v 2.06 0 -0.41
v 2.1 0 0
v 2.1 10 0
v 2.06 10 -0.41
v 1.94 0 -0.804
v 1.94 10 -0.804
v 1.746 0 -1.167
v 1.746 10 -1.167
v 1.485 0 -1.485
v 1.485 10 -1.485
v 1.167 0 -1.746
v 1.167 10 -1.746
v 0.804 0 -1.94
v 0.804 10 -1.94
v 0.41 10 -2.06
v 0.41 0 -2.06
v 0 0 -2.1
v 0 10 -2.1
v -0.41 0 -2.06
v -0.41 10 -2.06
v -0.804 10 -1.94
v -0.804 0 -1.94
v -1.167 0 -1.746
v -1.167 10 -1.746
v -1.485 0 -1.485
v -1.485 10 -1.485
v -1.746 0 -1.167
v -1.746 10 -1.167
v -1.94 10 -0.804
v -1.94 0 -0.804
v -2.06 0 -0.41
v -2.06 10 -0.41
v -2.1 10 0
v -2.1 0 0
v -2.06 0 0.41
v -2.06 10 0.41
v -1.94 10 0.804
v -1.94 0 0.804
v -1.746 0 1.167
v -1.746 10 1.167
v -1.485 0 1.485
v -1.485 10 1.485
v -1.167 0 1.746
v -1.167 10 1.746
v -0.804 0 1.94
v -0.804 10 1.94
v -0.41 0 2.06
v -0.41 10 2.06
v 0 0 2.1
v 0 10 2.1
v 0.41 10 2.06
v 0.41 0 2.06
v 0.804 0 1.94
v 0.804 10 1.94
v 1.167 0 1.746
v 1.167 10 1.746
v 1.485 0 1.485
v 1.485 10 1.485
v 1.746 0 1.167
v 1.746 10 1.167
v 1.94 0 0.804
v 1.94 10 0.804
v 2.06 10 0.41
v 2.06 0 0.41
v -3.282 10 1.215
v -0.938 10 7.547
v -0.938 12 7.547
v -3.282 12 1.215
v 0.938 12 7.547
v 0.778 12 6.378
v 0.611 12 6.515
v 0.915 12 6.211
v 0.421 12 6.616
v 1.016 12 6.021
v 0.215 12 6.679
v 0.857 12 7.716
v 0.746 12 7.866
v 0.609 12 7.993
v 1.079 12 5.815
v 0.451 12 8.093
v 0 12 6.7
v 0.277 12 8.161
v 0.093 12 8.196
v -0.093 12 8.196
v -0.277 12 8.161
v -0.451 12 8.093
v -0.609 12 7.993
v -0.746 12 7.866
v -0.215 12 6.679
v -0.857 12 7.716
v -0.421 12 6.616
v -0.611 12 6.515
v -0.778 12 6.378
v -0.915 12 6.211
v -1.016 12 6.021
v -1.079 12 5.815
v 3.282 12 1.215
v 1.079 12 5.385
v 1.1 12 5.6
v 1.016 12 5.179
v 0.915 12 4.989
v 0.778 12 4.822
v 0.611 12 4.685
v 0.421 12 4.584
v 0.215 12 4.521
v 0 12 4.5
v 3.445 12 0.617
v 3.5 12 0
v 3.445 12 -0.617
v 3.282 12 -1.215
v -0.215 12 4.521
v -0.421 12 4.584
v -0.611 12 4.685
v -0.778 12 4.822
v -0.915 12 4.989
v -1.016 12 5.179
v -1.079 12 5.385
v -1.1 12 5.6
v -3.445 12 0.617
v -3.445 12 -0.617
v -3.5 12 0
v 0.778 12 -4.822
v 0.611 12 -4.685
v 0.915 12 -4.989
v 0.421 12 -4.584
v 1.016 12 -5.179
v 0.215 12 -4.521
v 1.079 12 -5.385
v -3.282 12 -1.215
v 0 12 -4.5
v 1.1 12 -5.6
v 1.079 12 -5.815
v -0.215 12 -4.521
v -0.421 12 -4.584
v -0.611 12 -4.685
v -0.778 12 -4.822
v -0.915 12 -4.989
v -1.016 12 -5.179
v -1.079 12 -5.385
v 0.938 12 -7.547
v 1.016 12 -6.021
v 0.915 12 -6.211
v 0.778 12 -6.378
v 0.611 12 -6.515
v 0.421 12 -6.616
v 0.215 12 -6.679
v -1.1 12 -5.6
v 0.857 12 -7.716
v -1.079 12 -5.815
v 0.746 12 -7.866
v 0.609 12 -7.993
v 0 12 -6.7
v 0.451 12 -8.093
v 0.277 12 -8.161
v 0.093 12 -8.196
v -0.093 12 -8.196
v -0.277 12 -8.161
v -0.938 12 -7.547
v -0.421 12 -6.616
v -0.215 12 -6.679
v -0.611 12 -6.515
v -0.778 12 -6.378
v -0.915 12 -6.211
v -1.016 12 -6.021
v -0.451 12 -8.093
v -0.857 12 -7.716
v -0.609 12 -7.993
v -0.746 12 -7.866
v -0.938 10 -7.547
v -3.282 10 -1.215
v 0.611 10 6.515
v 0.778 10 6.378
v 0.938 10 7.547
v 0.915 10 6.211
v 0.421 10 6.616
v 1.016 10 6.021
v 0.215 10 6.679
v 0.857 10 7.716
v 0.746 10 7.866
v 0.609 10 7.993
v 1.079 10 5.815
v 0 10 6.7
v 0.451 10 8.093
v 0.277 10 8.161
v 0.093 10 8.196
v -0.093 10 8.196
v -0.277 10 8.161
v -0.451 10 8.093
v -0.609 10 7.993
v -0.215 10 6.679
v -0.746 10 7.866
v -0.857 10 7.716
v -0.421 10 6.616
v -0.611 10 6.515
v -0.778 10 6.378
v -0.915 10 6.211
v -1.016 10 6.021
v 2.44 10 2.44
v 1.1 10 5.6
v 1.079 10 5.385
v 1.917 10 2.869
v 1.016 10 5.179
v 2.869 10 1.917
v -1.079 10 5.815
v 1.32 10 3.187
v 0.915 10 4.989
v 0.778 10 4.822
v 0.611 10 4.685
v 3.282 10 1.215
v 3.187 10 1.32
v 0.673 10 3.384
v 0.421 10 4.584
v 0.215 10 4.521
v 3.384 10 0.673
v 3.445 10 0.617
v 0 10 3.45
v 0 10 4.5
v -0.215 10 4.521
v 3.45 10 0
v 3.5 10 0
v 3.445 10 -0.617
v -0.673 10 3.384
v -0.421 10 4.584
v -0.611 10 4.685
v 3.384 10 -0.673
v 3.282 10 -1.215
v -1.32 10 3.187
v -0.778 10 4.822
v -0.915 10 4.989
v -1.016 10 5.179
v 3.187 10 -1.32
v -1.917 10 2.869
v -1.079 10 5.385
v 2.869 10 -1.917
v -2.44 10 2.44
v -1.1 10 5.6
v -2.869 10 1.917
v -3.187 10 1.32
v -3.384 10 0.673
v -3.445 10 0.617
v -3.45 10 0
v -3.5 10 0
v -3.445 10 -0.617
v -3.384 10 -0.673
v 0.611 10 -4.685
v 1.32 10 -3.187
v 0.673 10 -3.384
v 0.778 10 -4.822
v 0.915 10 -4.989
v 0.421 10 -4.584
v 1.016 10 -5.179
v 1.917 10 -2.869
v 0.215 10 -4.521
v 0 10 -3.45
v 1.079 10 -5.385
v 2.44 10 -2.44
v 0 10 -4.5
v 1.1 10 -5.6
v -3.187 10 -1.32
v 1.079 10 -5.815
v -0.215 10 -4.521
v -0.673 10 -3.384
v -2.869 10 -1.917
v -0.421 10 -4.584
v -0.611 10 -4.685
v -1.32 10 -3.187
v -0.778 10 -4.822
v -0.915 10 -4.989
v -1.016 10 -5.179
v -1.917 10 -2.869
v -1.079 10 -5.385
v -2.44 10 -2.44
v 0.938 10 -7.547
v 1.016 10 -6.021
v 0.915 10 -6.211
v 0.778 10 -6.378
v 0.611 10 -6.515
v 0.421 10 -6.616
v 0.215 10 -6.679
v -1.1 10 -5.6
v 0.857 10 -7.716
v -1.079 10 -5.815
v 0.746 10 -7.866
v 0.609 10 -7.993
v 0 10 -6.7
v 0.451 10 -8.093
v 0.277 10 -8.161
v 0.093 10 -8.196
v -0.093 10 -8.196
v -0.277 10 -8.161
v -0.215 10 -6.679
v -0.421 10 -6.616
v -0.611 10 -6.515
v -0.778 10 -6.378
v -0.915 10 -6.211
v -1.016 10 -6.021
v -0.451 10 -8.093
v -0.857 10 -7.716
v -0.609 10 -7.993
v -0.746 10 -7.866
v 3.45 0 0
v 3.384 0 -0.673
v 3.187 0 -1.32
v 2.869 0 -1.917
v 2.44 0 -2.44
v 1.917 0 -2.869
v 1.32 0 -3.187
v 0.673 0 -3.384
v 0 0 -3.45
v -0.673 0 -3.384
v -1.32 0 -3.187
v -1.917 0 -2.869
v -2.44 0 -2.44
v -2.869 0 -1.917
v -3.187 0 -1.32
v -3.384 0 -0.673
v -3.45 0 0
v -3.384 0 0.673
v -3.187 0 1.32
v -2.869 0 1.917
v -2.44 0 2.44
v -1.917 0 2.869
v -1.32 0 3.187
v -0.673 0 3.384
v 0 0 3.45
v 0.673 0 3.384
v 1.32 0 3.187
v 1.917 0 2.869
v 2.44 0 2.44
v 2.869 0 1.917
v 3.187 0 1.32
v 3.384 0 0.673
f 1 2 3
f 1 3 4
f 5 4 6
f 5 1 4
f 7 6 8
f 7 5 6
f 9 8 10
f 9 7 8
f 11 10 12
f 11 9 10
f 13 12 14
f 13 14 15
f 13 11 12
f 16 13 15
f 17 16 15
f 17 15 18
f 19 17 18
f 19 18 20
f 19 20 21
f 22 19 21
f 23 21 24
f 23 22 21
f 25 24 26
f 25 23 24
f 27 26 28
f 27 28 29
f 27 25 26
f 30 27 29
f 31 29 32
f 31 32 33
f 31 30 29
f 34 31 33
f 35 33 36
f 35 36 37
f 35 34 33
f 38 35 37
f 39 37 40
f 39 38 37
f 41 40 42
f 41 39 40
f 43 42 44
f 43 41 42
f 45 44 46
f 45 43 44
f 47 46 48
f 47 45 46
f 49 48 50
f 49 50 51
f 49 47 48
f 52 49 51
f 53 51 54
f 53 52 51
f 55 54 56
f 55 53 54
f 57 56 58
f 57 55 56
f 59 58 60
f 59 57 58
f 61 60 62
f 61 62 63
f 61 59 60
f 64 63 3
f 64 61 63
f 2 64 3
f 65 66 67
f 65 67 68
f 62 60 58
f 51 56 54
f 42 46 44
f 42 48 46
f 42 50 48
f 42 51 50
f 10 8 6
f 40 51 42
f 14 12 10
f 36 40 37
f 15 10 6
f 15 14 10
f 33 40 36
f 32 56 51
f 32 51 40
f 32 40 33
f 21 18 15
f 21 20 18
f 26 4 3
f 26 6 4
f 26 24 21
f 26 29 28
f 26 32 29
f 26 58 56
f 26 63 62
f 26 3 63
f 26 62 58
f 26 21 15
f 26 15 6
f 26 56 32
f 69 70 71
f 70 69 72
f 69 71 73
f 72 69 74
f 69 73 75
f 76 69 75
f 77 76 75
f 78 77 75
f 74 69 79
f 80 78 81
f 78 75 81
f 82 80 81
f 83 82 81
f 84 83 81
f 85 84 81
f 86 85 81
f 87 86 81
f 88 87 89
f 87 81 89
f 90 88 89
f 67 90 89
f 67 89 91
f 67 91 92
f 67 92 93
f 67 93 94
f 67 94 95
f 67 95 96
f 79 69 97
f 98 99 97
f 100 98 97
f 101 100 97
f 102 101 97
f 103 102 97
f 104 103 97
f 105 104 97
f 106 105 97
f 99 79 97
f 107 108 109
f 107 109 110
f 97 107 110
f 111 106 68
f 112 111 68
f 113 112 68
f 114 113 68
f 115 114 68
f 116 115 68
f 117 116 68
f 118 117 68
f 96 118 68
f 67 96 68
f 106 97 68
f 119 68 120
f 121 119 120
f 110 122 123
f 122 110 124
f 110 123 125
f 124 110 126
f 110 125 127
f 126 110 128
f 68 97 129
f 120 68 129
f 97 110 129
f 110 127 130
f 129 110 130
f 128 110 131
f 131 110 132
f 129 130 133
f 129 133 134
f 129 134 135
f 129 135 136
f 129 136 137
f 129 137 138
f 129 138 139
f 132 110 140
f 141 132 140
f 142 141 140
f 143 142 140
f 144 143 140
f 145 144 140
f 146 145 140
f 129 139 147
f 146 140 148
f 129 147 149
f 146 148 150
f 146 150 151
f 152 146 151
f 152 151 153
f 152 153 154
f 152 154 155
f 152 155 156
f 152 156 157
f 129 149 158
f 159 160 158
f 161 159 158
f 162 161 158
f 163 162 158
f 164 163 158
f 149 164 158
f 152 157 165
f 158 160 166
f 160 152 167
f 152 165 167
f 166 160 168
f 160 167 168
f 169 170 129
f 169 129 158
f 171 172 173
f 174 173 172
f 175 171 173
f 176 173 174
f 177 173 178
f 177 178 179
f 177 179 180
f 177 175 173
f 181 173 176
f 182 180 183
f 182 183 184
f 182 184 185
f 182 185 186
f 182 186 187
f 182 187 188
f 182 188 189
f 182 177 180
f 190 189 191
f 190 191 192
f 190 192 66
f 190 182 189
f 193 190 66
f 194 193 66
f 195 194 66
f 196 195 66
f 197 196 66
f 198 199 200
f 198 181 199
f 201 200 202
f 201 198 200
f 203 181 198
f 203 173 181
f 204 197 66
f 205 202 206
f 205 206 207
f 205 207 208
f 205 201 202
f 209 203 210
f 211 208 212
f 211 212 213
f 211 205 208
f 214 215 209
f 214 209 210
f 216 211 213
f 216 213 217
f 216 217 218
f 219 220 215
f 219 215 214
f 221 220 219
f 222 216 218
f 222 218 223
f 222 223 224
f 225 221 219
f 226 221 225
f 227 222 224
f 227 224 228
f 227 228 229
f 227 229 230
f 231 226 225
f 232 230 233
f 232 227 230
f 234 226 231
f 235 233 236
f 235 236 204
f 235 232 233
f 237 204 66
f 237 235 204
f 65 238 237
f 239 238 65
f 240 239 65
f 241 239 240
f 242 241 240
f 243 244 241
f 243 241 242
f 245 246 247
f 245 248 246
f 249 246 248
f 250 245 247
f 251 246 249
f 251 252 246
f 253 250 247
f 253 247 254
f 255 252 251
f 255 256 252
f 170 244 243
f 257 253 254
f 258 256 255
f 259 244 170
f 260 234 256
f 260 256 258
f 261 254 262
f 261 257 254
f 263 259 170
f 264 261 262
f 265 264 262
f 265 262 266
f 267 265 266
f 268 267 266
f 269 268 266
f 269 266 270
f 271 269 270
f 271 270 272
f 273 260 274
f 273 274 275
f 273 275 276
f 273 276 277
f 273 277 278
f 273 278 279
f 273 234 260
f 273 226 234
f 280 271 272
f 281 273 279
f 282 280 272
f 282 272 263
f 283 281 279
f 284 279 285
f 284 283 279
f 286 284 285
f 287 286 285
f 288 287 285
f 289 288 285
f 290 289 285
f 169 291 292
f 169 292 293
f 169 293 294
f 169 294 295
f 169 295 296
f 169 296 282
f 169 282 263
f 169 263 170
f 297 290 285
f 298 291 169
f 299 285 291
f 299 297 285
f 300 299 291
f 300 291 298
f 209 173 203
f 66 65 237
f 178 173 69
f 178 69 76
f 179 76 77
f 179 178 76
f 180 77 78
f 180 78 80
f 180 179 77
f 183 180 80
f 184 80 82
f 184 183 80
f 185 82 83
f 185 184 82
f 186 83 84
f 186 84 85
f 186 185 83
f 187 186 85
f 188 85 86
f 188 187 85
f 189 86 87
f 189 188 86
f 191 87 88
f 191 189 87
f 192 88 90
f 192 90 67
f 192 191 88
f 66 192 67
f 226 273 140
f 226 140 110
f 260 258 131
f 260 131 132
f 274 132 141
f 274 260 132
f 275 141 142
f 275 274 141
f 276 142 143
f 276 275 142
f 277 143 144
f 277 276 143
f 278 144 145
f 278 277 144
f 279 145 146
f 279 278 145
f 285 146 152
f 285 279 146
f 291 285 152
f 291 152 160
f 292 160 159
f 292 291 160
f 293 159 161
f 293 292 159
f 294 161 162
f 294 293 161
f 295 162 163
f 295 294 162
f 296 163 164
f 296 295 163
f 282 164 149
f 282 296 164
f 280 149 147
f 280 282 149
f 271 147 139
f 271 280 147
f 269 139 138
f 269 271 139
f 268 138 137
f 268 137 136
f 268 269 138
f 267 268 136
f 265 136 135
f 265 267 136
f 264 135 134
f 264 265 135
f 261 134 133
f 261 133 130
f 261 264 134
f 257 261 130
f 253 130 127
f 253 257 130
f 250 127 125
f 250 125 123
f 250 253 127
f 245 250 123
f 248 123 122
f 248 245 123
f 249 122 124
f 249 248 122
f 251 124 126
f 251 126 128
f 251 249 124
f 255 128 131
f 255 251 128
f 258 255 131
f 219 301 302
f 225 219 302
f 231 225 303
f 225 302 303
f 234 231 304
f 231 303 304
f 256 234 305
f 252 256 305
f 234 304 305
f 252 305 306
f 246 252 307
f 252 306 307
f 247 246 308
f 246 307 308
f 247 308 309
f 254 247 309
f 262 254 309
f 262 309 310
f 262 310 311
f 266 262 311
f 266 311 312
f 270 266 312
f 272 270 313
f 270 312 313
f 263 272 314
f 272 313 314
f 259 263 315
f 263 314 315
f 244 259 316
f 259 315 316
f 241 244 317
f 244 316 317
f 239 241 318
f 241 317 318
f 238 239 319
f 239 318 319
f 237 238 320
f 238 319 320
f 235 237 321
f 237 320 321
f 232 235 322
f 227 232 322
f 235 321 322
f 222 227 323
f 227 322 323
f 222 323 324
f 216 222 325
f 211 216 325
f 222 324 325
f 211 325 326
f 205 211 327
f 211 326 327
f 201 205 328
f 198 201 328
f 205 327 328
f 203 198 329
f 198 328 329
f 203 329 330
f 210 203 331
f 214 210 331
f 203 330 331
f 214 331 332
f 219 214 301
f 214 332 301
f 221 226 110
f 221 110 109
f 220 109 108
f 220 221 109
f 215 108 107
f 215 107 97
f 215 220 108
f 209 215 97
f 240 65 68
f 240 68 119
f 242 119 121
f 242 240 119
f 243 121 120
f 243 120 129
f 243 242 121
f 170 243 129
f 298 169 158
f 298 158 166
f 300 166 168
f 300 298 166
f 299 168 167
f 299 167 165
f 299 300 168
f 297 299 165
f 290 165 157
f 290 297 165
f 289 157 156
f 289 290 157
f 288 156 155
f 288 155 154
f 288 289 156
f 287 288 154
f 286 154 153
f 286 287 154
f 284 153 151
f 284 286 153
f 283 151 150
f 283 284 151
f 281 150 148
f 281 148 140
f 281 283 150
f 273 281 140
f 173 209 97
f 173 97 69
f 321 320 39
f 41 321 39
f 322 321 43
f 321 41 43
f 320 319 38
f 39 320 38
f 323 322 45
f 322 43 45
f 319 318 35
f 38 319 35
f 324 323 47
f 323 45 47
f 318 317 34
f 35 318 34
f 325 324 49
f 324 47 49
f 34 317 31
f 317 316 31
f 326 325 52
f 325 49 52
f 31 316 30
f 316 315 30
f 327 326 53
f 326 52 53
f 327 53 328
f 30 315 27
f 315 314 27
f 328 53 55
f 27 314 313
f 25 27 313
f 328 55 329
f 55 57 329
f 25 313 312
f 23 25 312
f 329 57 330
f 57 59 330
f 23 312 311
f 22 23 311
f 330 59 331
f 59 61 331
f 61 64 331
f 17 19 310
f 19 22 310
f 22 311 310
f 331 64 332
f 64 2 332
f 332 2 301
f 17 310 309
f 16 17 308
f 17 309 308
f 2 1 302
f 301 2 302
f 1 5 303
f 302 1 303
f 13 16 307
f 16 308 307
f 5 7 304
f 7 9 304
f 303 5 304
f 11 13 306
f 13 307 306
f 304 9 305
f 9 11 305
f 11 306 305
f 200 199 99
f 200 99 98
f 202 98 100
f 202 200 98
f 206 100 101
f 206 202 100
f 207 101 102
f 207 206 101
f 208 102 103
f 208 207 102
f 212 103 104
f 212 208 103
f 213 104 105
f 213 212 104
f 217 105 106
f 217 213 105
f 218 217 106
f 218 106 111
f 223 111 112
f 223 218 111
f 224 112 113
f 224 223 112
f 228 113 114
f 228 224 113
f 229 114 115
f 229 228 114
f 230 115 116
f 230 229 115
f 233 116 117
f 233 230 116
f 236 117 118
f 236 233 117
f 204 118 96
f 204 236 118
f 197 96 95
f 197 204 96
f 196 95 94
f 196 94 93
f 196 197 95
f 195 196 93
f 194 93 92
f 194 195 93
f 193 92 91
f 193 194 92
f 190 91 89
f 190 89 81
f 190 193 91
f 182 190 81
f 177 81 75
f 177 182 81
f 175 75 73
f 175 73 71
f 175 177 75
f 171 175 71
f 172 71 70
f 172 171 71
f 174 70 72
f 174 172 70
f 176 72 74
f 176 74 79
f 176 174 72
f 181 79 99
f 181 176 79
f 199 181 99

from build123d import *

# Parameters (mm, degrees)
SKETCH1_R           = 3.45
SKETCH1_R_2         = 2.1
BOSS_EXTRUDE1_DEPTH = 10
SKETCH2_R           = 1.1
BOSS_EXTRUDE2_DEPTH = 2


with BuildPart() as part:
    # Sketch1 → Boss-Extrude1 (new body)
    with BuildSketch(Plane(origin=(0, 0, 0), x_dir=(1, 0, 0), z_dir=(0, 1, 0))):
        Circle(SKETCH1_R)
        Circle(SKETCH1_R_2, mode=Mode.SUBTRACT)
    extrude(amount=BOSS_EXTRUDE1_DEPTH)

    # Sketch2 → Boss-Extrude2 (add)
    with BuildSketch(Plane(origin=(0, 10, 0), x_dir=(1, 0, 0), z_dir=(0, 1, 0))):
        with BuildLine():
            Line((-3.282257873, 1.215229712), (-0.937787964, 7.547493269))
            ThreePointArc((-0.937787964, 7.547493269), (0, 8.200284779), (0.937787964, 7.547493269))
            Line((0.937787964, 7.547493269), (3.282257873, 1.215229712))
            ThreePointArc((3.282257873, 1.215229712), (3.5, 0), (3.282257873, -1.215229712))
            Line((3.282257873, -1.215229712), (0.937787964, -7.547493269))
            ThreePointArc((0.937787964, -7.547493269), (0, -8.200284779), (-0.937787964, -7.547493269))
            Line((-0.937787964, -7.547493269), (-3.282257873, -1.215229712))
            ThreePointArc((-3.282257873, -1.215229712), (-3.5, 0), (-3.282257873, 1.215229712))
        make_face()
        with Locations((0, -5.6)):
            Circle(SKETCH2_R, mode=Mode.SUBTRACT)
        with Locations((0, 5.6)):
            Circle(SKETCH2_R, mode=Mode.SUBTRACT)
    extrude(amount=BOSS_EXTRUDE2_DEPTH)


solid = part.part
